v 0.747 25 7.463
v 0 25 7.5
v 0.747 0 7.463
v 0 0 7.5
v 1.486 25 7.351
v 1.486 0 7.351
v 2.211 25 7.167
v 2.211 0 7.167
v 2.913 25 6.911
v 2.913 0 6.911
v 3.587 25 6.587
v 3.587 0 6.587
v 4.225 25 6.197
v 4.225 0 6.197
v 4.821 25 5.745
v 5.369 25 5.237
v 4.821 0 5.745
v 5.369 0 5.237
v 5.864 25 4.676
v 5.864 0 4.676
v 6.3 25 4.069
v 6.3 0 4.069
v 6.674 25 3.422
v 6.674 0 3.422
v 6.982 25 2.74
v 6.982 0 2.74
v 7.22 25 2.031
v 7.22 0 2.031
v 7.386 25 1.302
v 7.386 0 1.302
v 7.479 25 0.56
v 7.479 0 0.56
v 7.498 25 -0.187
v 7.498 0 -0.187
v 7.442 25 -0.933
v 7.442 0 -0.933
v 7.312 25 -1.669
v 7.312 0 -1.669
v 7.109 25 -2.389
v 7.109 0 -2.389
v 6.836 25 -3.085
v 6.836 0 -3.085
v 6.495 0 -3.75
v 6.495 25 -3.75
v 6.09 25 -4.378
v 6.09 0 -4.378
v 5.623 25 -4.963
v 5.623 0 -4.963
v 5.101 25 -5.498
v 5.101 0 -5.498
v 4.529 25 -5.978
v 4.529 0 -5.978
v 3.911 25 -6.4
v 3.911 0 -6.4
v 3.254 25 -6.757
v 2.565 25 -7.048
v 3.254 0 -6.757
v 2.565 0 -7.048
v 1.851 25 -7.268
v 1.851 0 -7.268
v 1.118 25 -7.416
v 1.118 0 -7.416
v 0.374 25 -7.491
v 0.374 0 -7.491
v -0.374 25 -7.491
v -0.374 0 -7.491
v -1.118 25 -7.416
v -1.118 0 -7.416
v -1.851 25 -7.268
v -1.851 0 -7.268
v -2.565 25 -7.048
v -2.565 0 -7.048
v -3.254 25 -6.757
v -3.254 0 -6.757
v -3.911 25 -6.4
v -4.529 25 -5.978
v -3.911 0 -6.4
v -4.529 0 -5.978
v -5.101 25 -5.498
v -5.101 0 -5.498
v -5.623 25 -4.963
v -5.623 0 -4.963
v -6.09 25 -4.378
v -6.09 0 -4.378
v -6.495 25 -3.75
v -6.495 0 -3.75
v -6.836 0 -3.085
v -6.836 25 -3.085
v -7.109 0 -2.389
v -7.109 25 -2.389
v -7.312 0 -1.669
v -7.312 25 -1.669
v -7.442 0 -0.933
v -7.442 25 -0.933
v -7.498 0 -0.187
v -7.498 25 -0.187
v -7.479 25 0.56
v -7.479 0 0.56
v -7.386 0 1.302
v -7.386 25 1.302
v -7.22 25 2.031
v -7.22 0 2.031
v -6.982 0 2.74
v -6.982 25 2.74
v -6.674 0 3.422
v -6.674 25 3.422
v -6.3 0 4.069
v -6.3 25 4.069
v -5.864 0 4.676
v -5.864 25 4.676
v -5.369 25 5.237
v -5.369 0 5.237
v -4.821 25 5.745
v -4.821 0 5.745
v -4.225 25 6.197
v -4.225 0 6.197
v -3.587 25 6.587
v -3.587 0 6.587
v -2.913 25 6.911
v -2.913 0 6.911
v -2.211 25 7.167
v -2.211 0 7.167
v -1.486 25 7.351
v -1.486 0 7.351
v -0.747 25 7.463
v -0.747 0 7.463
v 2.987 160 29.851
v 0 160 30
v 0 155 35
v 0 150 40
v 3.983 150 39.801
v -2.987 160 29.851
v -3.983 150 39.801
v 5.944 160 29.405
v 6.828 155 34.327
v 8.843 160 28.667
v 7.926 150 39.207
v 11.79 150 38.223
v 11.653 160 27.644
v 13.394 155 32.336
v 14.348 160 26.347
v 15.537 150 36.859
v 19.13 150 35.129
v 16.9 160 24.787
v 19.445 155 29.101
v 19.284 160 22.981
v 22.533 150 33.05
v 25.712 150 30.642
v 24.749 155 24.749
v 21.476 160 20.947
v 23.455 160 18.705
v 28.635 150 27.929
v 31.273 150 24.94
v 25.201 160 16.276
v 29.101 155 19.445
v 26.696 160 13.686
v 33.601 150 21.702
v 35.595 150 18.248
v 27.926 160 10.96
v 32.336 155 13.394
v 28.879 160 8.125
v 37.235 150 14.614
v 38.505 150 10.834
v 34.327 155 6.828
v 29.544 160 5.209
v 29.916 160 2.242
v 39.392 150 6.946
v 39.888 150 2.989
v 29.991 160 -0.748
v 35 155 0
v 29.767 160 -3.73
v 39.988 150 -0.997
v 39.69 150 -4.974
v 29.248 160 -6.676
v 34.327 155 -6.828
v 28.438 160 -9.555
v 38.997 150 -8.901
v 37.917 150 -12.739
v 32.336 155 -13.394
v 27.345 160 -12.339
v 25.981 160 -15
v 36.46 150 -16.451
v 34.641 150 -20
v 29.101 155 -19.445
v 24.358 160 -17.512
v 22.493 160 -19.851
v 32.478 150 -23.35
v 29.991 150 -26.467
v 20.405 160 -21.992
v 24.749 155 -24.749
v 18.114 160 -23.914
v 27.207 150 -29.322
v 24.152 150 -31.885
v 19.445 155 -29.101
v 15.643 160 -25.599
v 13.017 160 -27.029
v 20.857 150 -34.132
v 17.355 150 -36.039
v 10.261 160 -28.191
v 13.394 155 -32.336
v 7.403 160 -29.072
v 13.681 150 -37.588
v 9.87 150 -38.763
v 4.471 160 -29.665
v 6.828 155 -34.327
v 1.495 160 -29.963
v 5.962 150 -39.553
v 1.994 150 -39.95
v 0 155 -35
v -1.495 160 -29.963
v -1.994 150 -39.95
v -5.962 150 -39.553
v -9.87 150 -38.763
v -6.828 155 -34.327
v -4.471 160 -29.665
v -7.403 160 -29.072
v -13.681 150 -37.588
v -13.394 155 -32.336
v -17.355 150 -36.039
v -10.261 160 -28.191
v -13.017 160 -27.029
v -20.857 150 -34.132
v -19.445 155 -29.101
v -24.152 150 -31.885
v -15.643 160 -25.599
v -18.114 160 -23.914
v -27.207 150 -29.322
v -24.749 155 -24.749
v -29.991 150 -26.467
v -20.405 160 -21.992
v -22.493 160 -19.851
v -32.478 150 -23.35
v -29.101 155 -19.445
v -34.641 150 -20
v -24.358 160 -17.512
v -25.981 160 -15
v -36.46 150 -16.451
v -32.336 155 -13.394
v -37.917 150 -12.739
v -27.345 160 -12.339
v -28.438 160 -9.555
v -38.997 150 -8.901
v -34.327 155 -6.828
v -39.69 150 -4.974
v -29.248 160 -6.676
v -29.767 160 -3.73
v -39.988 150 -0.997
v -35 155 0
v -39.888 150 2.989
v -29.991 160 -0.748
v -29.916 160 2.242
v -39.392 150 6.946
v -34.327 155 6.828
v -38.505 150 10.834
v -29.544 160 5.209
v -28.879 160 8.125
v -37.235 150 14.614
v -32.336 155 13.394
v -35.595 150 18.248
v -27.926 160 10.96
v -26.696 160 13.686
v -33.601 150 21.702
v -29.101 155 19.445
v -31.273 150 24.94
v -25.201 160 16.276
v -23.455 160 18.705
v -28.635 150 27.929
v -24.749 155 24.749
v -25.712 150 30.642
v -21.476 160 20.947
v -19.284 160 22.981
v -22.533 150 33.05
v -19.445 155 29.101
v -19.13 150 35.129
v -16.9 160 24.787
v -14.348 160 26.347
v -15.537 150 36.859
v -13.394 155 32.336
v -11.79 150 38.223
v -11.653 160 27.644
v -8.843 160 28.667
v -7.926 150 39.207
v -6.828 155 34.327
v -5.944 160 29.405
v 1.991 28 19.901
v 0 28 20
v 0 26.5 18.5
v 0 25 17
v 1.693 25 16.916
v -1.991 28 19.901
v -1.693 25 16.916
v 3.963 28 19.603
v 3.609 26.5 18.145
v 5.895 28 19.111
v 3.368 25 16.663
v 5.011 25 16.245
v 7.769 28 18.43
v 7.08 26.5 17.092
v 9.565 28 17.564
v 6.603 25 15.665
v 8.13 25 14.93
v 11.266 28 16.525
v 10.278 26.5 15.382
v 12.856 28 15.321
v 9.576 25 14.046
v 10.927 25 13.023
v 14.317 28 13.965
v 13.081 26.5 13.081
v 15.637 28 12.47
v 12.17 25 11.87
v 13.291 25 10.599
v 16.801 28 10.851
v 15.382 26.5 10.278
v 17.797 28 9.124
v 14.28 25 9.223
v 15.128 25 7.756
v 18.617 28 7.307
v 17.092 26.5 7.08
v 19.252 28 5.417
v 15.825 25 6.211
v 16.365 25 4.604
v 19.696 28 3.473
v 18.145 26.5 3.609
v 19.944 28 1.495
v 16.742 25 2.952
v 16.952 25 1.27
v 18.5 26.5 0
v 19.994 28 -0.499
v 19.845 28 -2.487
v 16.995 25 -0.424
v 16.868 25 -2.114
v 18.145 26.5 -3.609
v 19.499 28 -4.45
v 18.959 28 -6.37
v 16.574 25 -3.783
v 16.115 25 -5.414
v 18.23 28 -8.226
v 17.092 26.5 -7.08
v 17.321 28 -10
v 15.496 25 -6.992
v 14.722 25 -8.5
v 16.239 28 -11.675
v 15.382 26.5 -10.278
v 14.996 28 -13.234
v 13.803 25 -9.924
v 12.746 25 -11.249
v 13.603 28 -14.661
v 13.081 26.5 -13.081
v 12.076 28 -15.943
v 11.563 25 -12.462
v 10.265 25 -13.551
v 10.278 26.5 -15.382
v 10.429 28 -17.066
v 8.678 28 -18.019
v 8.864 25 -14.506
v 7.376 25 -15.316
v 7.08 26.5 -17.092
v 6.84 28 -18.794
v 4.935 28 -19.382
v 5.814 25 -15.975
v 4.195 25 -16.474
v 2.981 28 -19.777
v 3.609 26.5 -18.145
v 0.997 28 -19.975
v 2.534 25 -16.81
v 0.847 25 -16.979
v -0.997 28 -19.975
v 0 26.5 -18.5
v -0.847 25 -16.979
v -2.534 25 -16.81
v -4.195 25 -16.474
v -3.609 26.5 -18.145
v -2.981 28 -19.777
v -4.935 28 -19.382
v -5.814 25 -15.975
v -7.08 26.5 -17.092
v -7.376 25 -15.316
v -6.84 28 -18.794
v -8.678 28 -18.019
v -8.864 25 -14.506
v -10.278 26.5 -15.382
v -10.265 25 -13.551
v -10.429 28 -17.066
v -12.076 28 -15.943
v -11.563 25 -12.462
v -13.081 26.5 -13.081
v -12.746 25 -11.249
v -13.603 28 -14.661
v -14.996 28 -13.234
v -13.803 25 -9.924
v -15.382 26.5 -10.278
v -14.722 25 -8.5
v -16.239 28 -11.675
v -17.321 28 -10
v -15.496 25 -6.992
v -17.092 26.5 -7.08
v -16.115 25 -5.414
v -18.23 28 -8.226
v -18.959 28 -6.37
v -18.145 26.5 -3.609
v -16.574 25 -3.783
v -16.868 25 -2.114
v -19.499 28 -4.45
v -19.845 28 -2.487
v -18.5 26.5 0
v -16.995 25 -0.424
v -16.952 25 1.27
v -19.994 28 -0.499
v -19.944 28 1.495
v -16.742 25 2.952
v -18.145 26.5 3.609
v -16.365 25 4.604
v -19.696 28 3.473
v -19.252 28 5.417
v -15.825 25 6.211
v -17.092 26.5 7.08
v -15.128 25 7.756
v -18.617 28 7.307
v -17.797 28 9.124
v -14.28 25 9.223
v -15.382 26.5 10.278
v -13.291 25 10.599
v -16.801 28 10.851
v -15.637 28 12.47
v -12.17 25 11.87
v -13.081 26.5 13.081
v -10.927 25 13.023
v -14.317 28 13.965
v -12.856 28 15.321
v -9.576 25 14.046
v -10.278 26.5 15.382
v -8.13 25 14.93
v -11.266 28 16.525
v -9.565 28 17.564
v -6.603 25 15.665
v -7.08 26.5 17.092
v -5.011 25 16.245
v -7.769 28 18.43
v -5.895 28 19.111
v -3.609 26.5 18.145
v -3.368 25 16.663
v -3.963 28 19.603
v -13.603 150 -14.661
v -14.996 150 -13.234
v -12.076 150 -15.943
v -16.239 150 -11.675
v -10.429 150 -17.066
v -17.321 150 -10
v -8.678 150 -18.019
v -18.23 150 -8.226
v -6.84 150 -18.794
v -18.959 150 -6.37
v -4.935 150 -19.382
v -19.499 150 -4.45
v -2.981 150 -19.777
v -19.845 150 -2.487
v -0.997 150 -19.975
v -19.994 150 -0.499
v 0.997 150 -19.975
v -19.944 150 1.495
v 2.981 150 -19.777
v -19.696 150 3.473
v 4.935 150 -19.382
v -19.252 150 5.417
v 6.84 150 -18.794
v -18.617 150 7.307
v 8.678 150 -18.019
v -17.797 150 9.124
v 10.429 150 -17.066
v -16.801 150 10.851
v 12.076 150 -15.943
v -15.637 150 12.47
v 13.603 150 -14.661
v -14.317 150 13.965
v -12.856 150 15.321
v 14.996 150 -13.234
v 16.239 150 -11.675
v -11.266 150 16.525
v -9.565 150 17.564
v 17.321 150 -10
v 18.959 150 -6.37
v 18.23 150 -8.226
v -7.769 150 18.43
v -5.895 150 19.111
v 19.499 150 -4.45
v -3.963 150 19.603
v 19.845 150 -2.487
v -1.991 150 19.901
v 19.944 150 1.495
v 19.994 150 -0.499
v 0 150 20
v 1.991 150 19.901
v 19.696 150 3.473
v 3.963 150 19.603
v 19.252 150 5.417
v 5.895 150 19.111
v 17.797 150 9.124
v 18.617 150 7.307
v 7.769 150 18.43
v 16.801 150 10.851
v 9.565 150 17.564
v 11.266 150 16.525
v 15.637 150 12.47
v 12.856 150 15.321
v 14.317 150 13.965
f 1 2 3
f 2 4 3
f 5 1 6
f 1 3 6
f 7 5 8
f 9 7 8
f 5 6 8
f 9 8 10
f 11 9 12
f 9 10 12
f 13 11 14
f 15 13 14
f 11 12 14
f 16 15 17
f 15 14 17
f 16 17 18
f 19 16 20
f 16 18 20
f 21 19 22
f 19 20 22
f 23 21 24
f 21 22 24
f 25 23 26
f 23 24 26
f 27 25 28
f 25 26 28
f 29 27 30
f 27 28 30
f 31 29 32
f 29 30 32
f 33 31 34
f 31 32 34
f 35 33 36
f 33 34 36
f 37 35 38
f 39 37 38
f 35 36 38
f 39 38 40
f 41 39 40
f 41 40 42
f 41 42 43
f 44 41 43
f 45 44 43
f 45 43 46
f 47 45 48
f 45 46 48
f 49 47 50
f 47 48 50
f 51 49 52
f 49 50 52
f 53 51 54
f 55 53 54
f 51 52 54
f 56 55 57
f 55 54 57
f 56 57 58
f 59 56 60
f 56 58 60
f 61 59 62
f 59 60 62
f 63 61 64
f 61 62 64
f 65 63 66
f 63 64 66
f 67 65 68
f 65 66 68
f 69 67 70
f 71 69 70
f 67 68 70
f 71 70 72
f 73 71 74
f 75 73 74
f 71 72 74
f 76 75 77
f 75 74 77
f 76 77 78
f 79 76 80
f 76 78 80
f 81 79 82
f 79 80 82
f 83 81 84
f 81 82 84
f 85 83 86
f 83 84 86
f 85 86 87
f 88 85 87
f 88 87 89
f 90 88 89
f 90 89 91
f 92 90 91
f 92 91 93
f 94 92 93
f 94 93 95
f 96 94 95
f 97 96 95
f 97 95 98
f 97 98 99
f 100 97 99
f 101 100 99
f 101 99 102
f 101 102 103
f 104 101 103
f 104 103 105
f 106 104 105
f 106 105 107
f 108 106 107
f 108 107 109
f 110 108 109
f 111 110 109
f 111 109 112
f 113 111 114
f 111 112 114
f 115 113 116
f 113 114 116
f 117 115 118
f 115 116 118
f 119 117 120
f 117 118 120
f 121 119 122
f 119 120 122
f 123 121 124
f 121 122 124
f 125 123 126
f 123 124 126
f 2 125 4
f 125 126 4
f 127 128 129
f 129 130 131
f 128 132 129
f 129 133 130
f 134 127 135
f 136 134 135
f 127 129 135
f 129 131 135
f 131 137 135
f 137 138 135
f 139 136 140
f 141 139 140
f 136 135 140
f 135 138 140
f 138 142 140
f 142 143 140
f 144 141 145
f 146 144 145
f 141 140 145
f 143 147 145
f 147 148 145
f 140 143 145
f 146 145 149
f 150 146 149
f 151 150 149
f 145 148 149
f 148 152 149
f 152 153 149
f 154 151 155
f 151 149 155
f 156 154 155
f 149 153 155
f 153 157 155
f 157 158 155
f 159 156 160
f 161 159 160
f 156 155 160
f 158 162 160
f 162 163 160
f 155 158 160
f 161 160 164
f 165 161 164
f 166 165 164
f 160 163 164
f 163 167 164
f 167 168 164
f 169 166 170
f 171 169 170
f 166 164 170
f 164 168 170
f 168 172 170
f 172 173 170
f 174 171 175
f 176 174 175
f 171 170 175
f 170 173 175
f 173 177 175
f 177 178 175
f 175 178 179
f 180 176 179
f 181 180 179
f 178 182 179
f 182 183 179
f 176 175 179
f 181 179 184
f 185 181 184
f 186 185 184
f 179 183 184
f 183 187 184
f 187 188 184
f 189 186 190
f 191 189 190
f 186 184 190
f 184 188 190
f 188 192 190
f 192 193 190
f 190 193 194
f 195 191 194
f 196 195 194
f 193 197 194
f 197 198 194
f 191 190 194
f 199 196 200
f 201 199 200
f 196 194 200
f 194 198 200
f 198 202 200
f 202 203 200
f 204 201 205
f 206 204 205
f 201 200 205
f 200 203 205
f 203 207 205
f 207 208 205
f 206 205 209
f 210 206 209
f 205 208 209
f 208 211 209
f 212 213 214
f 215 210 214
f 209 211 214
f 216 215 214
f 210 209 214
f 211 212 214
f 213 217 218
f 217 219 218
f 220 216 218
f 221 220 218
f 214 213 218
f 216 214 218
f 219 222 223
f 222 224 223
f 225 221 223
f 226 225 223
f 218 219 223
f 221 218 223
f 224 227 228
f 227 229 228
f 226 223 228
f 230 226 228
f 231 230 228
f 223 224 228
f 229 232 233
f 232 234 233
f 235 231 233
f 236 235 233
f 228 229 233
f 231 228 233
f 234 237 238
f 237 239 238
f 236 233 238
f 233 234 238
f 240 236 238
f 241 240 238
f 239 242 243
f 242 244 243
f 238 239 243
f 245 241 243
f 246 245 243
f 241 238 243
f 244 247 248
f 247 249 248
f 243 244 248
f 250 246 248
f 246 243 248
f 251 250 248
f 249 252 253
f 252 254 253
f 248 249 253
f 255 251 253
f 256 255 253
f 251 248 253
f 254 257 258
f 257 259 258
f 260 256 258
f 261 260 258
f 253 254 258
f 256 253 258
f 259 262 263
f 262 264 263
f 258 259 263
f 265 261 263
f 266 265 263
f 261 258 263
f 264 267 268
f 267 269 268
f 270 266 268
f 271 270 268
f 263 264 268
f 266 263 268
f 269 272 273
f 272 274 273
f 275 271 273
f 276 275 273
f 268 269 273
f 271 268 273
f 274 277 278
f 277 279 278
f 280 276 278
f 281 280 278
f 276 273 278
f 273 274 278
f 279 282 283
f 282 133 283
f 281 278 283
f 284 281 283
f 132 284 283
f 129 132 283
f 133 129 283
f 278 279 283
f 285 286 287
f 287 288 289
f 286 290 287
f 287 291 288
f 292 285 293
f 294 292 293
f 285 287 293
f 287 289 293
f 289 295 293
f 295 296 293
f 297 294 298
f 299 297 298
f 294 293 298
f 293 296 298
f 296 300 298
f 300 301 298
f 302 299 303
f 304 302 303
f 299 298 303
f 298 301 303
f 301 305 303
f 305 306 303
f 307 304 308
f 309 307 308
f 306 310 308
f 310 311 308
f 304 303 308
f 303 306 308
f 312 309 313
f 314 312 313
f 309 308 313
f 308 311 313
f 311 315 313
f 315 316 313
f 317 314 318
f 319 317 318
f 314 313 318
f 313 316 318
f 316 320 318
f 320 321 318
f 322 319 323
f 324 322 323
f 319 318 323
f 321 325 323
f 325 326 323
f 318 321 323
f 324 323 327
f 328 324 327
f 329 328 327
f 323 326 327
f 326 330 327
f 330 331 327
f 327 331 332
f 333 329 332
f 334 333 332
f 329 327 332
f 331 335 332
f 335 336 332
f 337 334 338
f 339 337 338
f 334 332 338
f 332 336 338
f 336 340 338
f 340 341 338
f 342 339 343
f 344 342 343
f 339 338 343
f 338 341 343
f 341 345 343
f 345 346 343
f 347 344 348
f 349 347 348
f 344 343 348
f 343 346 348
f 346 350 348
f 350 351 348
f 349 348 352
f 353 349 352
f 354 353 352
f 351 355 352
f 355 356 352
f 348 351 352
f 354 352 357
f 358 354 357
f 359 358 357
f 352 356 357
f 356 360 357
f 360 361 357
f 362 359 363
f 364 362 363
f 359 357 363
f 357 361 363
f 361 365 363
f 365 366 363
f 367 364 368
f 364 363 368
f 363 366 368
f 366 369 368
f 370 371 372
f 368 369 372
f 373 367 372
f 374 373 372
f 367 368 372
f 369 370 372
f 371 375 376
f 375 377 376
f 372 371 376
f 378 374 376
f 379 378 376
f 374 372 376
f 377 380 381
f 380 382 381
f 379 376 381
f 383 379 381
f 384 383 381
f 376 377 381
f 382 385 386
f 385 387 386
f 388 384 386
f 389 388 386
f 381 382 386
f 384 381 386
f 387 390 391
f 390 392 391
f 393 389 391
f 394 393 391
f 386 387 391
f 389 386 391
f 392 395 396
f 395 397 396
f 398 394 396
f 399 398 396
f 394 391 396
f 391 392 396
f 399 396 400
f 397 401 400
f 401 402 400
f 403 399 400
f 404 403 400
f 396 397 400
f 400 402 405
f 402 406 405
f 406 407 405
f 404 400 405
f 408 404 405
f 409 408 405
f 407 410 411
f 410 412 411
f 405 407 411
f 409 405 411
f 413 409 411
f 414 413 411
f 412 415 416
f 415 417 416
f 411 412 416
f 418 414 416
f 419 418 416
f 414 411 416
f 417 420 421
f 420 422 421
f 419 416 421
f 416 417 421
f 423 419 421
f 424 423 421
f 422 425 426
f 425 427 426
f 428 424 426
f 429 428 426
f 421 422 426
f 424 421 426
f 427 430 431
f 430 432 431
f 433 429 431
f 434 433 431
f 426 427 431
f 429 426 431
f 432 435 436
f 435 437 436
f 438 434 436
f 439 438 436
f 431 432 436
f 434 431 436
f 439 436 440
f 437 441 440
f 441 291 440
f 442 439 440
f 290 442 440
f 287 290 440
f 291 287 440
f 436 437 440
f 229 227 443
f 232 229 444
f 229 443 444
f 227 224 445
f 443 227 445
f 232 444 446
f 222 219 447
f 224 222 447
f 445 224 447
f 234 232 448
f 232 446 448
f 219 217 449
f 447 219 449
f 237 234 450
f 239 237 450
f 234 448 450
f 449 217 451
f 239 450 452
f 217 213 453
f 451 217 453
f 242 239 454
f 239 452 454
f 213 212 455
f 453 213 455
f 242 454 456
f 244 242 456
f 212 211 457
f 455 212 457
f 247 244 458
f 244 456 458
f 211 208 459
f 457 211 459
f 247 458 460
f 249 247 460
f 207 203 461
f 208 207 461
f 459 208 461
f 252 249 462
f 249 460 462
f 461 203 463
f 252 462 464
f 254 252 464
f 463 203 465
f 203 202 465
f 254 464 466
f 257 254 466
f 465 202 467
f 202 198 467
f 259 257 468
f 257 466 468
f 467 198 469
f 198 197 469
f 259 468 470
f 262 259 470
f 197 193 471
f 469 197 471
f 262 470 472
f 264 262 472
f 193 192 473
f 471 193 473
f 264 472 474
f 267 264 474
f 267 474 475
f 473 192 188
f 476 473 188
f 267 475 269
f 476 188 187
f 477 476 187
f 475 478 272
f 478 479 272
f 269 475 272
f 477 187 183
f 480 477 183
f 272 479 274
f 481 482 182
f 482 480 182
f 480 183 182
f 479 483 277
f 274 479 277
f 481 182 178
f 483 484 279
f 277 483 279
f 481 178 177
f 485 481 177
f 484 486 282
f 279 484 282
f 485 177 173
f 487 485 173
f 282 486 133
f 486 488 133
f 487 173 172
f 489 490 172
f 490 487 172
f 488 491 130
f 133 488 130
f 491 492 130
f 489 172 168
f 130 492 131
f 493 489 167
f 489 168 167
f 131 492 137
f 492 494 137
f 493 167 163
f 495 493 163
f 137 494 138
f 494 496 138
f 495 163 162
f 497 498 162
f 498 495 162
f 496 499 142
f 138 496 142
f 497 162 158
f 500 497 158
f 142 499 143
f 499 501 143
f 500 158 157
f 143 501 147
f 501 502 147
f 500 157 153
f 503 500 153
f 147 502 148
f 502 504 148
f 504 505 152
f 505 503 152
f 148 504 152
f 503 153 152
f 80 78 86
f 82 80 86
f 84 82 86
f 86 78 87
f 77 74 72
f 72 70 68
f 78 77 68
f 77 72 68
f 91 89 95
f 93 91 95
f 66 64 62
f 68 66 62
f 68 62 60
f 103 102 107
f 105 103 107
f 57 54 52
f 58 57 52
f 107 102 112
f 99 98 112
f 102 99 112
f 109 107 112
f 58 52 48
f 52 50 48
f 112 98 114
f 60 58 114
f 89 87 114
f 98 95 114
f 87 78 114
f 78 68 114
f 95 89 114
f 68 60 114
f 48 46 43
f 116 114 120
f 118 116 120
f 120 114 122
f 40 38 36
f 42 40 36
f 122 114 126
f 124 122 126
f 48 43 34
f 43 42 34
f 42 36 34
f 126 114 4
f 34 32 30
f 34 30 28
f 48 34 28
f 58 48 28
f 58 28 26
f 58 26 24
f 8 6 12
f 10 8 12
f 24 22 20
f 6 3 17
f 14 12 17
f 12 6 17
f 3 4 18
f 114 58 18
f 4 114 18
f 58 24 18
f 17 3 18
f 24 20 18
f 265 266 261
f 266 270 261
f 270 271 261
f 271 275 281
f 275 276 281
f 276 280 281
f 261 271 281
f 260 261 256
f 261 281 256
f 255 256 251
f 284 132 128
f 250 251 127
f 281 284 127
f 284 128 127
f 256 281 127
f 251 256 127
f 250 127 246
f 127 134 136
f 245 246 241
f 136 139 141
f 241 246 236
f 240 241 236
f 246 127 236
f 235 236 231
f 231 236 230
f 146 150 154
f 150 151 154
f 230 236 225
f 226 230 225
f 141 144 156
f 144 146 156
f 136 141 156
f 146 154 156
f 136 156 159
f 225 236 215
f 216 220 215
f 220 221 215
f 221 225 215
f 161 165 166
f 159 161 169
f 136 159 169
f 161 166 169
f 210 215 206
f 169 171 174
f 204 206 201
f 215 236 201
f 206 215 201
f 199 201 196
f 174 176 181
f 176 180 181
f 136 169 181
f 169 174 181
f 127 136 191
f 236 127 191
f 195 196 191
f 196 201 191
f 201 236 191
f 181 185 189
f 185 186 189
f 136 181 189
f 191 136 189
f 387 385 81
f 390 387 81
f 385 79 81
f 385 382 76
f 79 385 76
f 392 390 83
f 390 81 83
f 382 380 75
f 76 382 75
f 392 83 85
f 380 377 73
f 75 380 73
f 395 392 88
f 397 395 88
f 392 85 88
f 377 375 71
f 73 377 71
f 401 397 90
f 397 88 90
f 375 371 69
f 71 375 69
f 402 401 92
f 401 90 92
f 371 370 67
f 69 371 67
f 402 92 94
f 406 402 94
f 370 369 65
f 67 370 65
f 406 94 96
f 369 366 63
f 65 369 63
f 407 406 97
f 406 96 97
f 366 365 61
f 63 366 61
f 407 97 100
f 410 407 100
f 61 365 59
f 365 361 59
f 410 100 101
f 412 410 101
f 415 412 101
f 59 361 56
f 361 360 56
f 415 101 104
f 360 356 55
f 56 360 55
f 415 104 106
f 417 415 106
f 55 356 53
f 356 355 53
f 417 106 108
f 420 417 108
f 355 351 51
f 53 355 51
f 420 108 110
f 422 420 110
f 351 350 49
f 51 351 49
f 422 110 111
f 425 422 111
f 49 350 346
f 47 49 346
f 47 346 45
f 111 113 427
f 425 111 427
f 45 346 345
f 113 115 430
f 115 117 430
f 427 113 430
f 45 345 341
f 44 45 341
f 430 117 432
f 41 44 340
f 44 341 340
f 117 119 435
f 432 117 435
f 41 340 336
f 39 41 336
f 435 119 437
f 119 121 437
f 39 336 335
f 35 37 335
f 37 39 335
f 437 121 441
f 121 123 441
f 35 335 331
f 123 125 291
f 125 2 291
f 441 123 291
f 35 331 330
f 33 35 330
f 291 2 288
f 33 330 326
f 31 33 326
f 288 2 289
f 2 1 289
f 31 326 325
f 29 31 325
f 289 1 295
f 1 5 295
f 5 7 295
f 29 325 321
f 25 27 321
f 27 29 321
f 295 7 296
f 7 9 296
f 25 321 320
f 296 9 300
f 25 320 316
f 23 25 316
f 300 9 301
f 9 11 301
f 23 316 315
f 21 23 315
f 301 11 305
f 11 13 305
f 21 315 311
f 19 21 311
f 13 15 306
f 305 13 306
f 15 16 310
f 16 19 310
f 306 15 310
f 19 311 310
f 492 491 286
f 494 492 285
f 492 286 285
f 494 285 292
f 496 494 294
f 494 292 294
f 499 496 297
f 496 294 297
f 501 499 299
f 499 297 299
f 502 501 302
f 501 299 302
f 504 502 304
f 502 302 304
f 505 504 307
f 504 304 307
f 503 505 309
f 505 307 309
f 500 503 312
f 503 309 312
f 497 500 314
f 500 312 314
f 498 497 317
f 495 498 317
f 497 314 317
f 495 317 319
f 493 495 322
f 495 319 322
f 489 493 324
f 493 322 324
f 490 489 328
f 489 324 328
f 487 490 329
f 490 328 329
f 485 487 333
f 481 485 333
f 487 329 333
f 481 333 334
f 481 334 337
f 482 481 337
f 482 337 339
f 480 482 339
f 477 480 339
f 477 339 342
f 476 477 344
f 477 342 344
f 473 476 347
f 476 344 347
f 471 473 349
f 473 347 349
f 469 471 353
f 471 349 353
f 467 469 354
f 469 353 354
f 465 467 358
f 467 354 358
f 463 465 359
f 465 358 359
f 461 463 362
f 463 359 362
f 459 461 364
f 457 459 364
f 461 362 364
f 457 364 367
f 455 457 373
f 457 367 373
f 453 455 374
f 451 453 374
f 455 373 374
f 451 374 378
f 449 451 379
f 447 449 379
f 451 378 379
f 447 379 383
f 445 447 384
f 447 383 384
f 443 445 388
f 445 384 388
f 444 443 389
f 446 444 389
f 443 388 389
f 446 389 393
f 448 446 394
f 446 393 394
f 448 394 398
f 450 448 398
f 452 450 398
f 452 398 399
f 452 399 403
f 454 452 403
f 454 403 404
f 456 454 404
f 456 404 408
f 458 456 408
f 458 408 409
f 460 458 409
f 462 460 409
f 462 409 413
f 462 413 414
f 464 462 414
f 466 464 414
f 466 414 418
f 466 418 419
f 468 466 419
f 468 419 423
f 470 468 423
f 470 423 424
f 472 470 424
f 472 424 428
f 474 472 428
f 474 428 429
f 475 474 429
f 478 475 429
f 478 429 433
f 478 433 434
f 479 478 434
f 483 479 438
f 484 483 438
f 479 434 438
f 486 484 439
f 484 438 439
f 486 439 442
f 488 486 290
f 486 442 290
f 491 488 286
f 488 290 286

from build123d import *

# Parameters (mm, degrees)
F2_SIZE2 = 9.99999
F2_SIZE  = 9.99999
F3_SIZE2 = 3
F3_SIZE  = 3


# Not quite as in the source:
# - a fillet or chamfer is up to 0.001 mm smaller than in the source, because OpenCascade refuses the exact size


with BuildPart() as f1:
    # F0 (on Right) → F1 (revolve)
    with BuildSketch(Plane.YZ):
        Polygon((0, 0), (160, 0), (160, 40), (150, 40), (150, 20), (25, 20), (25, 7.5), (0, 7.5), align=None)
    revolve(axis=Axis((0, 80, 0), (0, 1, 0)))

    # F2 (size 10 and 10 in the source; OpenCascade refuses exactly that, so slightly less here)
    f2_edges = [f1.edges().sort_by_distance(p)[0] for p in [
        (0, 160, -40),
    ]]
    chamfer(f2_edges, length=F2_SIZE, length2=F2_SIZE2)

    # F3
    f3_edges = [f1.edges().sort_by_distance(p)[0] for p in [
        (0, 25, -20),
    ]]
    chamfer(f3_edges, length=F3_SIZE, length2=F3_SIZE2)


solid = f1.part
